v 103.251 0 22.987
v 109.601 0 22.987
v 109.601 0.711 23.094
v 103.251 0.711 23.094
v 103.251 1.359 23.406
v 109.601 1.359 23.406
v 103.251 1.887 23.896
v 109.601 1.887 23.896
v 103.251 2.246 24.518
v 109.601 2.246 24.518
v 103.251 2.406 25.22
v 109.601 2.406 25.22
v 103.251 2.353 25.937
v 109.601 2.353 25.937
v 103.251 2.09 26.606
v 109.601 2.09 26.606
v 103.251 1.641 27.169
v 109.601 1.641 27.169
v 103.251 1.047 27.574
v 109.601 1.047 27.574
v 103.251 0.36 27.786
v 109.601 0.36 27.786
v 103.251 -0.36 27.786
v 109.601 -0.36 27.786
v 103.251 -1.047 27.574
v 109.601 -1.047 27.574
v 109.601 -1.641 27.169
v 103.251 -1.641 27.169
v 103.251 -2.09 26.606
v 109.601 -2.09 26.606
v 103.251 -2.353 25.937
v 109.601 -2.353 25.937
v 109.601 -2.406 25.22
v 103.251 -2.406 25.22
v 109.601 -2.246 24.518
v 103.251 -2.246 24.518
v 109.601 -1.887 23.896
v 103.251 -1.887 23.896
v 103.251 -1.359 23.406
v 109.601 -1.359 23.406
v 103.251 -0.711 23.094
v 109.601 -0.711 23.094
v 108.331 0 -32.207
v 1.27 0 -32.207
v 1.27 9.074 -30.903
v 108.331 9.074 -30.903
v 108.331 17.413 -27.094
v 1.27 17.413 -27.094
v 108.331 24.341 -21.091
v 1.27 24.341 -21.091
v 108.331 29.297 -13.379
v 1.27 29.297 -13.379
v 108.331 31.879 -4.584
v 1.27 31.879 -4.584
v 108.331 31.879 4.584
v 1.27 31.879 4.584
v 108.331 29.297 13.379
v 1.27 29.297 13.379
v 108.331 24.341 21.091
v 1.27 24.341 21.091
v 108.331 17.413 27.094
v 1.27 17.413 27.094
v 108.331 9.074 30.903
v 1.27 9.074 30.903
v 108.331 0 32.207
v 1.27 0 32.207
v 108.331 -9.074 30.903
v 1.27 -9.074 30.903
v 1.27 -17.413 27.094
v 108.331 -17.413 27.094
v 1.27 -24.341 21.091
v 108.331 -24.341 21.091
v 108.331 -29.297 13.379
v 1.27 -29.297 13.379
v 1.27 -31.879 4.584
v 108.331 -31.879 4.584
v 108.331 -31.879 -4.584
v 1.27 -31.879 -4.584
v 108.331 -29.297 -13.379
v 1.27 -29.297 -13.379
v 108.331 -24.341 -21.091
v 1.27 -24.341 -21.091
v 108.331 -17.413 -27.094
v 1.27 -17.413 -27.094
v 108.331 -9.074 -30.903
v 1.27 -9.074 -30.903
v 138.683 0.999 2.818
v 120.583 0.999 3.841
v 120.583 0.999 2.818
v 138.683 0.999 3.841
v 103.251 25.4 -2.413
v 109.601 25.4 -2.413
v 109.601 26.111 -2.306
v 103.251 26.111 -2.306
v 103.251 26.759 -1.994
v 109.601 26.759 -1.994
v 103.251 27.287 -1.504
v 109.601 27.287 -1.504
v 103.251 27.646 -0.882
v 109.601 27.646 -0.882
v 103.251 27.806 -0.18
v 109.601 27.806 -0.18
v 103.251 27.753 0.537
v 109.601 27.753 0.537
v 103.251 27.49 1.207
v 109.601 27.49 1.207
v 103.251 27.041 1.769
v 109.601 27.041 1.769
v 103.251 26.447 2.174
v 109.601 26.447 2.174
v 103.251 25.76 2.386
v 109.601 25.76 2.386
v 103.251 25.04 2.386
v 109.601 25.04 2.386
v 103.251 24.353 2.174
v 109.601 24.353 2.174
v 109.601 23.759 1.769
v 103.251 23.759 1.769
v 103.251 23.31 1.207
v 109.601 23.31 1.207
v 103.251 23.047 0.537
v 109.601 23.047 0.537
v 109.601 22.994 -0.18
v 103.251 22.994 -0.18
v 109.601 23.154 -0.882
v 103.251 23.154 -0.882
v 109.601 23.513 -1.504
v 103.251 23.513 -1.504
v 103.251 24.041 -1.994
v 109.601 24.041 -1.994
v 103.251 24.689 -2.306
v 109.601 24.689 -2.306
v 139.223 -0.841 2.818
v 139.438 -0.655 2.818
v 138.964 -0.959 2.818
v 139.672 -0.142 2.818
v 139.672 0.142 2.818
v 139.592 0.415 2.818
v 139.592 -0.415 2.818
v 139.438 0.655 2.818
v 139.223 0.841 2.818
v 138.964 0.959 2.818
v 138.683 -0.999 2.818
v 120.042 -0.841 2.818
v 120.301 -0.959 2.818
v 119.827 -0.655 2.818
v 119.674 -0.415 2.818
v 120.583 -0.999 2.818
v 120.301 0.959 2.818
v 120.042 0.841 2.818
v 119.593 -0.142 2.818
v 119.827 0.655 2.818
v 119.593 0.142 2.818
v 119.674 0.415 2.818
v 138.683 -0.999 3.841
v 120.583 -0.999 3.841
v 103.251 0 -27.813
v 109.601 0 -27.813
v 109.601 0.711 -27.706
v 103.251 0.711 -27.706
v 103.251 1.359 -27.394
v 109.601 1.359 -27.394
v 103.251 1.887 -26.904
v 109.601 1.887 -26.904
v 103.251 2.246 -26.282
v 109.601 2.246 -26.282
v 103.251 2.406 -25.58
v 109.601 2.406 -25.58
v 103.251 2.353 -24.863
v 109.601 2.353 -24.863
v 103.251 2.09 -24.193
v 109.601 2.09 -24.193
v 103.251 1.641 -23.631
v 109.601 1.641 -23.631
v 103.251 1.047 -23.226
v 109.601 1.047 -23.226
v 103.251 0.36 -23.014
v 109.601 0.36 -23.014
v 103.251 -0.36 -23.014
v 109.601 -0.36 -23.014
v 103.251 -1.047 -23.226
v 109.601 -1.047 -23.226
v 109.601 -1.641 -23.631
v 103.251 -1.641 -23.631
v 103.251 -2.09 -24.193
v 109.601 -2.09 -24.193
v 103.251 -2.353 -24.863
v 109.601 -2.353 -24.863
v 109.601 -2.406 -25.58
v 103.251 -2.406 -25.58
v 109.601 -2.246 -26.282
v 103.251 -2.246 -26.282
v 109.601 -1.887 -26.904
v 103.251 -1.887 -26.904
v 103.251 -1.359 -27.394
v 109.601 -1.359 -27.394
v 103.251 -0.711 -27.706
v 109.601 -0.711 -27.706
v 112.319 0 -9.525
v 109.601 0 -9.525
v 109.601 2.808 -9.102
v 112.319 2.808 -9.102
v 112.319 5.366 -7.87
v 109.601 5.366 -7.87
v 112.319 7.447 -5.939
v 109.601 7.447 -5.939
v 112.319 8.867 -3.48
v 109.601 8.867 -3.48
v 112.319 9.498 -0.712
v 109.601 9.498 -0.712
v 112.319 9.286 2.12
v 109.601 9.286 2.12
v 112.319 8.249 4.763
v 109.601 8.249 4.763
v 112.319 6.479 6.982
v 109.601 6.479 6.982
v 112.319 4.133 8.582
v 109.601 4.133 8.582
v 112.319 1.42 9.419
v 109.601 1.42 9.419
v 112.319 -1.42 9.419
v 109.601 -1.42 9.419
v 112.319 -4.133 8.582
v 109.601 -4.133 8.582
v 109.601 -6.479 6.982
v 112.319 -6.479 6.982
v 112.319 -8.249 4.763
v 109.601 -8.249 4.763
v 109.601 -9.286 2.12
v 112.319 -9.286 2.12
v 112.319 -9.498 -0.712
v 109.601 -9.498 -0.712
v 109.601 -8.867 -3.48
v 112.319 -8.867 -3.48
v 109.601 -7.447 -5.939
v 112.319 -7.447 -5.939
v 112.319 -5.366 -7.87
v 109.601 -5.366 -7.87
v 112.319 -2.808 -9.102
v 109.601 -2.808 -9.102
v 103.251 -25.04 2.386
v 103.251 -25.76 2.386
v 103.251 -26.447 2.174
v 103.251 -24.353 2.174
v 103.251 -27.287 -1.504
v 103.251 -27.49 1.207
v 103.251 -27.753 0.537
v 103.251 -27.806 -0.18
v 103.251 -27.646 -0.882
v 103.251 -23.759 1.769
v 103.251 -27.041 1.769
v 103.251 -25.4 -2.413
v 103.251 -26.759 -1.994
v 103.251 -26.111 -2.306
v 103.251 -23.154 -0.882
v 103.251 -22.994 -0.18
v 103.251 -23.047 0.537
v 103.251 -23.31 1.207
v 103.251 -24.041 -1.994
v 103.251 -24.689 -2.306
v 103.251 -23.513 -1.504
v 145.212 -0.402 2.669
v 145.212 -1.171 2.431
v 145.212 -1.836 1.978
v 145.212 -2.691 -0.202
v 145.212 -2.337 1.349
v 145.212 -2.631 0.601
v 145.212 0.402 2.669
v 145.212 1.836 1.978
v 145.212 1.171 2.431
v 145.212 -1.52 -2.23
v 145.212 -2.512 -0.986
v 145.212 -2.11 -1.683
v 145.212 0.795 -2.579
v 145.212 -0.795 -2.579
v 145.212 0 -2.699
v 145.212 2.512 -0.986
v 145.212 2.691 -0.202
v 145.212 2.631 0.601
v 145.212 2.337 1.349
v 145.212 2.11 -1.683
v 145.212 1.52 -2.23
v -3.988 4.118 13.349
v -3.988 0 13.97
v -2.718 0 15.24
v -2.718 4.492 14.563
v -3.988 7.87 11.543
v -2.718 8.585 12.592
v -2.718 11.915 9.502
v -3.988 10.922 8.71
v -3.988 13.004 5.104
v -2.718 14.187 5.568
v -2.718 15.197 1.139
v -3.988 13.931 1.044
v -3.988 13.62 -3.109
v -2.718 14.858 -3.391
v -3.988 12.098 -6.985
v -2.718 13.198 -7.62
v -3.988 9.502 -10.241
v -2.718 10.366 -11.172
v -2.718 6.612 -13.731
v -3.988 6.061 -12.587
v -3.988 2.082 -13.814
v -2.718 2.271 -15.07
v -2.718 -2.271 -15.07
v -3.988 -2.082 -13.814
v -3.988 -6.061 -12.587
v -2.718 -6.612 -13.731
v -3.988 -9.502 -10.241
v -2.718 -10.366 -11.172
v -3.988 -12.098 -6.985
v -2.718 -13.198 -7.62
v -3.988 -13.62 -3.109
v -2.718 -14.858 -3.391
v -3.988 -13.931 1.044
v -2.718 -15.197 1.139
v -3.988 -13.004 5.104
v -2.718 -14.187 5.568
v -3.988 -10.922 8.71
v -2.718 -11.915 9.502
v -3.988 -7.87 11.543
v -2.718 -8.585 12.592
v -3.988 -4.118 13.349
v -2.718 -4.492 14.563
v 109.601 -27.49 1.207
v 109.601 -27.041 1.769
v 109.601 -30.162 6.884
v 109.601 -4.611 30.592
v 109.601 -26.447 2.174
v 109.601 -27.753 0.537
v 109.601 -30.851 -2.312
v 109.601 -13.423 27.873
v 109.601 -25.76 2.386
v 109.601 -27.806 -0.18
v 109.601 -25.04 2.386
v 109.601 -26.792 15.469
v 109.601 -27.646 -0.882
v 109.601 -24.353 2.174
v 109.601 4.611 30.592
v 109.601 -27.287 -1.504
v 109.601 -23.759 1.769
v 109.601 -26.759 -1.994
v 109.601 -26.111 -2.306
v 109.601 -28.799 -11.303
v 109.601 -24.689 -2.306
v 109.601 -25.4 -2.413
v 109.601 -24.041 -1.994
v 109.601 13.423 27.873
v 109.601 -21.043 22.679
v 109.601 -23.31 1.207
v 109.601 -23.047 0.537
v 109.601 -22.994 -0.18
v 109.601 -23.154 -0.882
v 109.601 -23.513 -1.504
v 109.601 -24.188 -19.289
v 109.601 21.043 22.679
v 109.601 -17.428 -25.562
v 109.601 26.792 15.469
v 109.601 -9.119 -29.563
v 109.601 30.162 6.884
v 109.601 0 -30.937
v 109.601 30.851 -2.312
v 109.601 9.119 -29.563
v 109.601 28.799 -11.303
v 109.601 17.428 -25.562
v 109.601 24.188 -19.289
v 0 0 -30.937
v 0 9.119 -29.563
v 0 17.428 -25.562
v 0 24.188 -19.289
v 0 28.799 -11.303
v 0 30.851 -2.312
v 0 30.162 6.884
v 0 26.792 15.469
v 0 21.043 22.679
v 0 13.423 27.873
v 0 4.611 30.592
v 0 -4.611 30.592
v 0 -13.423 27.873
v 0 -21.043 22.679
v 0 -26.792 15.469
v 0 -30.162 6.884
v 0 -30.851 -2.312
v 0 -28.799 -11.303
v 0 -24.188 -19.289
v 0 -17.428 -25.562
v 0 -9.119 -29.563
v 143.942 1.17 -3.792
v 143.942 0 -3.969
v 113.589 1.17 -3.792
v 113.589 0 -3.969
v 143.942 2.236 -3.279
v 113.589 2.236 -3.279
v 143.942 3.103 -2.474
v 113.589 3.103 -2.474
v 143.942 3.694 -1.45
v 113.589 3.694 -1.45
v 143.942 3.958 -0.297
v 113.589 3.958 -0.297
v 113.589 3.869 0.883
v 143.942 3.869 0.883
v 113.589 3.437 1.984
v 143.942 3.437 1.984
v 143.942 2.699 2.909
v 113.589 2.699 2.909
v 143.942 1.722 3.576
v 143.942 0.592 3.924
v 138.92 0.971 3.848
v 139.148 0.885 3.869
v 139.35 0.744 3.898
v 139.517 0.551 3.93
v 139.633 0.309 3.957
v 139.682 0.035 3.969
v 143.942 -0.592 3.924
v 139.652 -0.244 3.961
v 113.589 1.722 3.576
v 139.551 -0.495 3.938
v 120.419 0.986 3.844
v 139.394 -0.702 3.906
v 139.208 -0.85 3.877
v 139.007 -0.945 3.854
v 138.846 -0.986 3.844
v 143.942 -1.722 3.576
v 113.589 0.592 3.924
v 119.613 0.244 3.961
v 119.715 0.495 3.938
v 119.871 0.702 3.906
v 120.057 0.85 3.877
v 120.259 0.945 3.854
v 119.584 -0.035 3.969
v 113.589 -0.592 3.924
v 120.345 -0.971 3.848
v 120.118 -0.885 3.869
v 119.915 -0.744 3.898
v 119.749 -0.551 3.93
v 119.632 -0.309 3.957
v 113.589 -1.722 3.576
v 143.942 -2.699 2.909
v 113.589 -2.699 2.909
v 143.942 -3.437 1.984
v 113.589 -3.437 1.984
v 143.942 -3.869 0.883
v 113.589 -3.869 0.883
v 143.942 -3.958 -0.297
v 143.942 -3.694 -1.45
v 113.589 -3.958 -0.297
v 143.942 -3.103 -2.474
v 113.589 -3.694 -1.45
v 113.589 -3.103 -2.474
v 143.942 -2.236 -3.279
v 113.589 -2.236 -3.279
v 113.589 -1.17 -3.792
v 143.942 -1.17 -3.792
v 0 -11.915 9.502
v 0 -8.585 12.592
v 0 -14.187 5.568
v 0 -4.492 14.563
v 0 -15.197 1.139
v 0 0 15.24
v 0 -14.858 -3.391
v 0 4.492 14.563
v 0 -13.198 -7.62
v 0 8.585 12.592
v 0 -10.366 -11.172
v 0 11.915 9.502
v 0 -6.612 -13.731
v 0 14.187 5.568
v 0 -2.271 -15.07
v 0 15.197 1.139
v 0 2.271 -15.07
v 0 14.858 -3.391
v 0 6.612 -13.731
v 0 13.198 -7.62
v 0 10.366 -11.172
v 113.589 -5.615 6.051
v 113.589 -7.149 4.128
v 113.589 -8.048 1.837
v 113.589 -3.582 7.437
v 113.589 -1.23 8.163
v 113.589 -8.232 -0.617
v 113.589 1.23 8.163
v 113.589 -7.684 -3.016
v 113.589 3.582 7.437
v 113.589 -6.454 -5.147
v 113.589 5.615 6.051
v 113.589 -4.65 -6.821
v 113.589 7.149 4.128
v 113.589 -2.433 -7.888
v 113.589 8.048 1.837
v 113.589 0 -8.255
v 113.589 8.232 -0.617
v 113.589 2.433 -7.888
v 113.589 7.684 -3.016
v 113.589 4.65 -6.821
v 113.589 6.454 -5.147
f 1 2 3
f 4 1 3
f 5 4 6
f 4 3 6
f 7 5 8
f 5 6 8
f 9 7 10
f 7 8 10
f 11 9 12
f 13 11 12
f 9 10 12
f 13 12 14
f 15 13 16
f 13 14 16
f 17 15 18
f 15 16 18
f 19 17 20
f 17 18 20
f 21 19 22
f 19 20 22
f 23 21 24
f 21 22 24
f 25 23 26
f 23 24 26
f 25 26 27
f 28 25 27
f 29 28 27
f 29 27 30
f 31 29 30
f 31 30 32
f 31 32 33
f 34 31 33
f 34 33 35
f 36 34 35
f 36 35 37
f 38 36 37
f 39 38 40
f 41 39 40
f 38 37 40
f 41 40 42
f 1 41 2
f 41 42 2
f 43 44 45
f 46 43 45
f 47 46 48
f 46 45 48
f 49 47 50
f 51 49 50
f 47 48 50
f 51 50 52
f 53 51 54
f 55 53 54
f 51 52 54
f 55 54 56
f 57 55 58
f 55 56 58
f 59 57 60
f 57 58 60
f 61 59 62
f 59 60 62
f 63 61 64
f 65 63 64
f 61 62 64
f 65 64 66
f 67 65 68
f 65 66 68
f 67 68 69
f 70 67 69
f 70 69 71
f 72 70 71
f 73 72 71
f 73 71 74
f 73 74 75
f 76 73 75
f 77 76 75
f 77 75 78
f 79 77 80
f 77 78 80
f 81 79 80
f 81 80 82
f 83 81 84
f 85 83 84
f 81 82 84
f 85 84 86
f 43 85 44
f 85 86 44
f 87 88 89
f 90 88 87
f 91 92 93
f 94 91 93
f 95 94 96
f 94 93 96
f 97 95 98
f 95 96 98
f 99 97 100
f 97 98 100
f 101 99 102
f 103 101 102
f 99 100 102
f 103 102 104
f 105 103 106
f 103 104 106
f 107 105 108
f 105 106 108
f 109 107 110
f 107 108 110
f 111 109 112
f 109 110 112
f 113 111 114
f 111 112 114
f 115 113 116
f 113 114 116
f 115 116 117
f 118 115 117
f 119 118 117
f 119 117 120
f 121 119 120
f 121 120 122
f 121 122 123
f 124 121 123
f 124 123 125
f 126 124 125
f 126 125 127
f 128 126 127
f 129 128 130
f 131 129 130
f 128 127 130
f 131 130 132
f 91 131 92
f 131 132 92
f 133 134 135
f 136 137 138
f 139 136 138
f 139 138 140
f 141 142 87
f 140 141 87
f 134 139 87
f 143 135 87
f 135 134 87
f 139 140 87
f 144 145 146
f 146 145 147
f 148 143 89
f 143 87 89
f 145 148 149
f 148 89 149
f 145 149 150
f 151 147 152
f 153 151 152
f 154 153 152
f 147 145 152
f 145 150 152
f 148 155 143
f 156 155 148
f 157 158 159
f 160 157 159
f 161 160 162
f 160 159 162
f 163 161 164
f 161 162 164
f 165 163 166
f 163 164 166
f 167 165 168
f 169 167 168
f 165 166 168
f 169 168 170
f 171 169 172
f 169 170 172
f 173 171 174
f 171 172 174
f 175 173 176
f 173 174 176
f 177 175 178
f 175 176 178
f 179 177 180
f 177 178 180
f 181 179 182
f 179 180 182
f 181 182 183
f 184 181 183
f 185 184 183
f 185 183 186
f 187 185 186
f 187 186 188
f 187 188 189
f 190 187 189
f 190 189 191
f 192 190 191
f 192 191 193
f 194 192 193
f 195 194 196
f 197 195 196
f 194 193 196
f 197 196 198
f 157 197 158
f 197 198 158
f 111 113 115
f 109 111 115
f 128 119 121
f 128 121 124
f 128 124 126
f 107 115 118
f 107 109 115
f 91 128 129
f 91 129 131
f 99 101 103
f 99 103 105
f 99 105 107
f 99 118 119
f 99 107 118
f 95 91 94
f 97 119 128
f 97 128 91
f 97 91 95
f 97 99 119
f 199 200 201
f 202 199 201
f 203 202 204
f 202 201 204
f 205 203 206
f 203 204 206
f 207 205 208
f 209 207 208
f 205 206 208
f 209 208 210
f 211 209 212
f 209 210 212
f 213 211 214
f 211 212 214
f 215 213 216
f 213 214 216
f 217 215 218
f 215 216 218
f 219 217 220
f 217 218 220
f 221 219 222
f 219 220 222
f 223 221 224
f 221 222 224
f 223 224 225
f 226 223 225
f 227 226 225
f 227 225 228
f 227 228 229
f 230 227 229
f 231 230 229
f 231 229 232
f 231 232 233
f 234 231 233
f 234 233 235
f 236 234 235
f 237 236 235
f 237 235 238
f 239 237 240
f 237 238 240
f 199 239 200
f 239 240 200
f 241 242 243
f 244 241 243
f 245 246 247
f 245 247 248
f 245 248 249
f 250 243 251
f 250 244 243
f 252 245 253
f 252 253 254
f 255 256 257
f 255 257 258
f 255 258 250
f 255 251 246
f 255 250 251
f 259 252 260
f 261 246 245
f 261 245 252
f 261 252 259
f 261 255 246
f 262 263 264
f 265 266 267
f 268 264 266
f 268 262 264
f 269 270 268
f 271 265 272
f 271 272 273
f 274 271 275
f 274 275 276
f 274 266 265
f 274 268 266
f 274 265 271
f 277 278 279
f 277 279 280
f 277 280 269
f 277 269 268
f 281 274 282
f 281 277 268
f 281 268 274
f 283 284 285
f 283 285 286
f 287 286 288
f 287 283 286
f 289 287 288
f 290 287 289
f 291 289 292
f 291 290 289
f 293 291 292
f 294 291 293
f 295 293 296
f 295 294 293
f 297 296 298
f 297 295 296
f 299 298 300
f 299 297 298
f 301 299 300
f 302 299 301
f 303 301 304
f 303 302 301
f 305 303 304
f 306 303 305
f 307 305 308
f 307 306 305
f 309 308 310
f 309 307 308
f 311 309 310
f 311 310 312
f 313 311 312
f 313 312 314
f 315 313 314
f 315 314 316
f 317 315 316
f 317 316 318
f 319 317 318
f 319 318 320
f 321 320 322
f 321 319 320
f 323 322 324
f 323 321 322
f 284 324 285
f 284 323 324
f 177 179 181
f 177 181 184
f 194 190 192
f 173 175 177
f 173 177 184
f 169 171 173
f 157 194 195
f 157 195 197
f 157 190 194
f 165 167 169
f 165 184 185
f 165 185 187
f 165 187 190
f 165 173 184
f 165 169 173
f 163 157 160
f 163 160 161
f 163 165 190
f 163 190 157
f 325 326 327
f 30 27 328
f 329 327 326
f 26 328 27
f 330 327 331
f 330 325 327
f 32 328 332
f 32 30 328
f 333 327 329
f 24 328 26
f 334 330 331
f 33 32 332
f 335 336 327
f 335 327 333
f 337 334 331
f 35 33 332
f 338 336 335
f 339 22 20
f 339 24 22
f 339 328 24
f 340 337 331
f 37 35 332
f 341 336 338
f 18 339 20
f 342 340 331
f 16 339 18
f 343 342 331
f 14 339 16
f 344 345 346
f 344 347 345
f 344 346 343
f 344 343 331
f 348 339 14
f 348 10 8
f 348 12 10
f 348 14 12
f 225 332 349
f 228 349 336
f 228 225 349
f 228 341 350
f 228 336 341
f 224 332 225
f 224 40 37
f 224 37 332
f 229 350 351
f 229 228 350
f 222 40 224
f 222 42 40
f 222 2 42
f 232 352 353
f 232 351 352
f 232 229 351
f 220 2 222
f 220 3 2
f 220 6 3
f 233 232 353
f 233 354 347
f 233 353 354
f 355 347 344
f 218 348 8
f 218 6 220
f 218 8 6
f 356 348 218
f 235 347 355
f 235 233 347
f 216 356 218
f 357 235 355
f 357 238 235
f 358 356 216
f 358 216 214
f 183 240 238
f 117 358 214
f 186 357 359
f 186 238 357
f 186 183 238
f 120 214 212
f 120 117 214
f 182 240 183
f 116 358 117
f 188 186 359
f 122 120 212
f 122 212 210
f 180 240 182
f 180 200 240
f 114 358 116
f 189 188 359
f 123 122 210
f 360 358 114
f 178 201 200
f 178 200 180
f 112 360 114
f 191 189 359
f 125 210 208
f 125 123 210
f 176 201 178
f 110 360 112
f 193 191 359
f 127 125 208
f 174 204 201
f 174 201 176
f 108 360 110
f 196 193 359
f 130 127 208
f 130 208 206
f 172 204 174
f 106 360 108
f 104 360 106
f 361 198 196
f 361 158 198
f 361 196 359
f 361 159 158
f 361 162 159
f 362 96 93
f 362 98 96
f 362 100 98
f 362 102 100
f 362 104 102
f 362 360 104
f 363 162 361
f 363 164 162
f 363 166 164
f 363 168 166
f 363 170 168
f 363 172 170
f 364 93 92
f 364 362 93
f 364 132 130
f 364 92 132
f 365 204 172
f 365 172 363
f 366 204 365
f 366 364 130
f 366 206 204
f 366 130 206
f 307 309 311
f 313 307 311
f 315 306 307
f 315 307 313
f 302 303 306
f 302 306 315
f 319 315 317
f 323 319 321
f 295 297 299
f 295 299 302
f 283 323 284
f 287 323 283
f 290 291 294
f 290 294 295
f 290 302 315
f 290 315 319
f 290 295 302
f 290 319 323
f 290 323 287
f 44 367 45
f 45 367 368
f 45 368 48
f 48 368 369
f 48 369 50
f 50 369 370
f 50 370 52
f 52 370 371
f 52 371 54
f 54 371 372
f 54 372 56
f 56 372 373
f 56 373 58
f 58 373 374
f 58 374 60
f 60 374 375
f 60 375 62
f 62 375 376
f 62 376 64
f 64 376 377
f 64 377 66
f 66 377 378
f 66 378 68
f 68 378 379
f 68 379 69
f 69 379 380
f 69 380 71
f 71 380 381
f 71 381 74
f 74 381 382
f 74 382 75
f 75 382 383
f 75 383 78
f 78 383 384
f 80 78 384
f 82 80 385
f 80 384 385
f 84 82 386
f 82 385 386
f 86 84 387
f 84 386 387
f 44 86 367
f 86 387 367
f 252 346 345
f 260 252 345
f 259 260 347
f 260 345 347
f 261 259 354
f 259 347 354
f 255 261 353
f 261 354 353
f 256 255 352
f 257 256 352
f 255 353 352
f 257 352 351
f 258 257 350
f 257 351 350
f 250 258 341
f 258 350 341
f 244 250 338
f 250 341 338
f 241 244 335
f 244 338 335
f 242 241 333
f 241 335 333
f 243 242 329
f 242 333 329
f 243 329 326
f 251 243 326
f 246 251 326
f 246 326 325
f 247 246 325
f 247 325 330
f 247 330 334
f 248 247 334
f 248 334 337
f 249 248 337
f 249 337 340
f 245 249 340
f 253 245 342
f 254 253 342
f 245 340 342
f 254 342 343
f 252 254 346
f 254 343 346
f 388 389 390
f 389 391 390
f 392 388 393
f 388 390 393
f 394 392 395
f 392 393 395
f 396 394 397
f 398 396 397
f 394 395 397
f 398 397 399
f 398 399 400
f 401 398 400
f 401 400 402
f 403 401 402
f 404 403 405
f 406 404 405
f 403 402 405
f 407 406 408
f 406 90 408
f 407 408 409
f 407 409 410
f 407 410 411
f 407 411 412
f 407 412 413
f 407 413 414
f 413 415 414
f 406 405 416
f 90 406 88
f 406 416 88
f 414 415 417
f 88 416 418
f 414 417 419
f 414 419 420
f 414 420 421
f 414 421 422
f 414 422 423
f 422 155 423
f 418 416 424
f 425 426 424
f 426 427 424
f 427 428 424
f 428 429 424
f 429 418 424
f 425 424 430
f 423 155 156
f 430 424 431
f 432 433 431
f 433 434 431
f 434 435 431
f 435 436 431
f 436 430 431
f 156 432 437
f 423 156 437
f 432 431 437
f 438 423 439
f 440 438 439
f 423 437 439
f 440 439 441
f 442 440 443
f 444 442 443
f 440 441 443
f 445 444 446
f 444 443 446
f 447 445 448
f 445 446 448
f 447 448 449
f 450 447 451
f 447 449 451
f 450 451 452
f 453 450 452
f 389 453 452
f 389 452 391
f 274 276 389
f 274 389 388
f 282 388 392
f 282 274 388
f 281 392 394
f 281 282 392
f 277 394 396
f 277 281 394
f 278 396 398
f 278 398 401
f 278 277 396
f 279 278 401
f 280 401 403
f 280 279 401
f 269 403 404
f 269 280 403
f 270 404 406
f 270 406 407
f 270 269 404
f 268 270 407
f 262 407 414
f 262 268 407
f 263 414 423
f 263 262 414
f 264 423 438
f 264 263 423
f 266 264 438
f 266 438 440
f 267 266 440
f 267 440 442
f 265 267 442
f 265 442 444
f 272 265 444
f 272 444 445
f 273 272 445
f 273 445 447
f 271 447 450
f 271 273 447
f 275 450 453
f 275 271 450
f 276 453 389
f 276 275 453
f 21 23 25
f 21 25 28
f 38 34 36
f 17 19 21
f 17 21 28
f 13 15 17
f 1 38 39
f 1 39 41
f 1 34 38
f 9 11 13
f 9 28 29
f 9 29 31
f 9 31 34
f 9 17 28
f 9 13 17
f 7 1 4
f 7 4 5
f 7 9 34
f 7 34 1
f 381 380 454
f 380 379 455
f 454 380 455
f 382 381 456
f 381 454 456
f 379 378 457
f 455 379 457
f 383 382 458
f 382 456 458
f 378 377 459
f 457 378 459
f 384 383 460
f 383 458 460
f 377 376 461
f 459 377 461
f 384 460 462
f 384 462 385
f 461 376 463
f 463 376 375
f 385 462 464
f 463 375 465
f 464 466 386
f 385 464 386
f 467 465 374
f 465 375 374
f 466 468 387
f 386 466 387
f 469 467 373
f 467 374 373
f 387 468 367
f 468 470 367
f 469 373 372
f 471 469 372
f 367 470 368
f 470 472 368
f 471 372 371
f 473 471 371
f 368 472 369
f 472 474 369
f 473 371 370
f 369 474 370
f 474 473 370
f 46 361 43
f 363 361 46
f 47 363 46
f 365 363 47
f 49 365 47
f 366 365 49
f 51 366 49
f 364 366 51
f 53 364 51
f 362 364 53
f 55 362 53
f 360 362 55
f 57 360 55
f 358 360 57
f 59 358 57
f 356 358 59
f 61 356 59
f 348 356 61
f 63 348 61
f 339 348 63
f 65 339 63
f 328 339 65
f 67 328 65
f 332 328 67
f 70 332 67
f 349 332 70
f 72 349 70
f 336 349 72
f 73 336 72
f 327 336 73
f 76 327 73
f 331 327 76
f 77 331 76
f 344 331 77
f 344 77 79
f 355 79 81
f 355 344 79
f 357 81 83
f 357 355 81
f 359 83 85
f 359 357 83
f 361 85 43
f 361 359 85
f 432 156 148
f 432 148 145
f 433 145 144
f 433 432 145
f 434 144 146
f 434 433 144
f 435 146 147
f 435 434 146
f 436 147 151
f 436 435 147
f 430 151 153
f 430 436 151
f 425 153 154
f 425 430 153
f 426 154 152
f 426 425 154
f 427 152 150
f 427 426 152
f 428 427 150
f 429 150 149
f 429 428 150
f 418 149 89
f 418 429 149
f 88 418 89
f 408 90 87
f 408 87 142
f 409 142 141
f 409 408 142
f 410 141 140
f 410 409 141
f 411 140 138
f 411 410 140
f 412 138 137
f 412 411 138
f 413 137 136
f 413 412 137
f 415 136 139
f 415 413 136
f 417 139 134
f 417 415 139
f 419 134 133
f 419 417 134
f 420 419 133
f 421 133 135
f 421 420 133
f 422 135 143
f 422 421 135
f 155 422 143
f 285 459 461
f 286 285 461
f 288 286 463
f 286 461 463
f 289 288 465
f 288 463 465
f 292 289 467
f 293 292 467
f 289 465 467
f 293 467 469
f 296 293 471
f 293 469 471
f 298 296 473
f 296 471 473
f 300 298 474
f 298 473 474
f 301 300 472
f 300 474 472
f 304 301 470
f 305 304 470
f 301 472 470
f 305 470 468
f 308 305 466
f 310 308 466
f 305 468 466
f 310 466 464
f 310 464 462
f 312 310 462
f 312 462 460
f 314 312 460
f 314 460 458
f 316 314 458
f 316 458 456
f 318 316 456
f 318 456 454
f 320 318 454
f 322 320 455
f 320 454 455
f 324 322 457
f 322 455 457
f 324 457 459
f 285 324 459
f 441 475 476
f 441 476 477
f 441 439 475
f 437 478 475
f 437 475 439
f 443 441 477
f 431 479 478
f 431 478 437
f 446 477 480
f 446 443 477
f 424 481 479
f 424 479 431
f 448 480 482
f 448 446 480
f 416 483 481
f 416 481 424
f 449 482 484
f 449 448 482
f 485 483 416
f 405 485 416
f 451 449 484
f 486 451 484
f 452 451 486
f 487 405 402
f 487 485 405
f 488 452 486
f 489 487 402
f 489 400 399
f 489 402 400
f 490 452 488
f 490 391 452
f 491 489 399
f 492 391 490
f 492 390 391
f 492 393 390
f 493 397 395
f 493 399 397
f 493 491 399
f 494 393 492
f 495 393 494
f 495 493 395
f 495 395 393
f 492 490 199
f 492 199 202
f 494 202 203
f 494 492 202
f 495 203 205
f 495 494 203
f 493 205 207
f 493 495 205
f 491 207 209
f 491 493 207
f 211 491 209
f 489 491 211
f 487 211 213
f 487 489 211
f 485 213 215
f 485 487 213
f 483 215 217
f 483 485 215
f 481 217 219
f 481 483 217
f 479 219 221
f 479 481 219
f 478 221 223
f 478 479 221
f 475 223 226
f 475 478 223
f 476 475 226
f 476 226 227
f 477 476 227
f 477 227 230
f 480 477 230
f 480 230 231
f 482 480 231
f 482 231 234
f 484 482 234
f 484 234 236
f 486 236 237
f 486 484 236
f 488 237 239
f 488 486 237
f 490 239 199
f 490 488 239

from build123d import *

# Parameters (mm, degrees)
SKETCH2_R           = 32.2072
BOSS_EXTRUDE1_DEPTH = 109.601
CHAMFER1_SIZE       = 1.27
CHAMFER2_SIZE       = 1.27
SKETCH3_R           = 9.525
BOSS_EXTRUDE2_DEPTH = 3.9878
SKETCH4_R           = 3.96875
BOSS_EXTRUDE3_DEPTH = 31.623
CHAMFER3_SIZE       = 1.27
CHAMFER4_SIZE       = 1.27
SKETCH5_R           = 15.24
BOSS_EXTRUDE4_DEPTH = 3.9878
CHAMFER5_SIZE       = 1.27
CUT_EXTRUDE1_DEPTH  = 1.15062
SKETCH7_R           = 2.413
CUT_EXTRUDE2_DEPTH  = 6.35


with BuildPart() as part:
    # Sketch2 → Boss-Extrude1 (new body)
    with BuildSketch(Plane(origin=(0, 0, 0), x_dir=(0, 0, -1), z_dir=(1, 0, 0))):
        Circle(SKETCH2_R)
    extrude(amount=BOSS_EXTRUDE1_DEPTH)

    # Chamfer1
    chamfer1_edges = [part.edges().sort_by_distance(p)[0] for p in [
        (0, 0, 32.2072),
    ]]
    chamfer(chamfer1_edges, length=CHAMFER1_SIZE)

    # Chamfer2
    chamfer2_edges = [part.edges().sort_by_distance(p)[0] for p in [
        (109.601, 0, 32.2072),
    ]]
    chamfer(chamfer2_edges, length=CHAMFER2_SIZE)

    # Sketch3 → Boss-Extrude2 (add)
    with BuildSketch(Plane(origin=(109.601, 0, 0), x_dir=(0, 0, -1), z_dir=(1, 0, 0))):
        Circle(SKETCH3_R)
    extrude(amount=BOSS_EXTRUDE2_DEPTH)

    # Sketch4 → Boss-Extrude3 (add)
    with BuildSketch(Plane(origin=(113.5888, 0, 0), x_dir=(0, 0, -1), z_dir=(1, 0, 0))):
        Circle(SKETCH4_R)
    extrude(amount=BOSS_EXTRUDE3_DEPTH)

    # Chamfer3
    chamfer3_edges = [part.edges().sort_by_distance(p)[0] for p in [
        (113.5888, 0, 9.525),
    ]]
    chamfer(chamfer3_edges, length=CHAMFER3_SIZE)

    # Chamfer4
    chamfer4_edges = [part.edges().sort_by_distance(p)[0] for p in [
        (145.2118, 0, 3.96875),
    ]]
    chamfer(chamfer4_edges, length=CHAMFER4_SIZE)

    # Sketch5 → Boss-Extrude4 (add)
    with BuildSketch(Plane.ZY):
        Circle(SKETCH5_R)
    extrude(amount=BOSS_EXTRUDE4_DEPTH)

    # Chamfer5
    chamfer5_edges = [part.edges().sort_by_distance(p)[0] for p in [
        (-3.9878, 0, -15.24),
    ]]
    chamfer(chamfer5_edges, length=CHAMFER5_SIZE)

    # Sketch6 → Cut-Extrude1 (cut)
    with BuildSketch(Plane.XY.offset(3.96875)):
        with BuildLine():
            Line((120.58269, 0.99949), (138.68273, 0.99949))
            ThreePointArc((138.68273, 0.99949), (139.68222, 0), (138.68273, -0.99949))
            Line((138.68273, -0.99949), (120.58269, -0.99949))
            ThreePointArc((120.58269, -0.99949), (119.5832, 0), (120.58269, 0.99949))
        make_face()
    extrude(amount=-CUT_EXTRUDE1_DEPTH, mode=Mode.SUBTRACT)

    # Sketch7 → Cut-Extrude2 (cut)
    with BuildSketch(Plane(origin=(109.601, 0, 0), x_dir=(0, 0, -1), z_dir=(1, 0, 0))):
        with Locations((0, 25.4)):
            Circle(SKETCH7_R)
        with Locations((25.4, 0)):
            Circle(SKETCH7_R)
        with Locations((0, -25.4)):
            Circle(SKETCH7_R)
        with Locations((-25.4, 0)):
            Circle(SKETCH7_R)
    extrude(amount=-CUT_EXTRUDE2_DEPTH, mode=Mode.SUBTRACT)


solid = part.part
